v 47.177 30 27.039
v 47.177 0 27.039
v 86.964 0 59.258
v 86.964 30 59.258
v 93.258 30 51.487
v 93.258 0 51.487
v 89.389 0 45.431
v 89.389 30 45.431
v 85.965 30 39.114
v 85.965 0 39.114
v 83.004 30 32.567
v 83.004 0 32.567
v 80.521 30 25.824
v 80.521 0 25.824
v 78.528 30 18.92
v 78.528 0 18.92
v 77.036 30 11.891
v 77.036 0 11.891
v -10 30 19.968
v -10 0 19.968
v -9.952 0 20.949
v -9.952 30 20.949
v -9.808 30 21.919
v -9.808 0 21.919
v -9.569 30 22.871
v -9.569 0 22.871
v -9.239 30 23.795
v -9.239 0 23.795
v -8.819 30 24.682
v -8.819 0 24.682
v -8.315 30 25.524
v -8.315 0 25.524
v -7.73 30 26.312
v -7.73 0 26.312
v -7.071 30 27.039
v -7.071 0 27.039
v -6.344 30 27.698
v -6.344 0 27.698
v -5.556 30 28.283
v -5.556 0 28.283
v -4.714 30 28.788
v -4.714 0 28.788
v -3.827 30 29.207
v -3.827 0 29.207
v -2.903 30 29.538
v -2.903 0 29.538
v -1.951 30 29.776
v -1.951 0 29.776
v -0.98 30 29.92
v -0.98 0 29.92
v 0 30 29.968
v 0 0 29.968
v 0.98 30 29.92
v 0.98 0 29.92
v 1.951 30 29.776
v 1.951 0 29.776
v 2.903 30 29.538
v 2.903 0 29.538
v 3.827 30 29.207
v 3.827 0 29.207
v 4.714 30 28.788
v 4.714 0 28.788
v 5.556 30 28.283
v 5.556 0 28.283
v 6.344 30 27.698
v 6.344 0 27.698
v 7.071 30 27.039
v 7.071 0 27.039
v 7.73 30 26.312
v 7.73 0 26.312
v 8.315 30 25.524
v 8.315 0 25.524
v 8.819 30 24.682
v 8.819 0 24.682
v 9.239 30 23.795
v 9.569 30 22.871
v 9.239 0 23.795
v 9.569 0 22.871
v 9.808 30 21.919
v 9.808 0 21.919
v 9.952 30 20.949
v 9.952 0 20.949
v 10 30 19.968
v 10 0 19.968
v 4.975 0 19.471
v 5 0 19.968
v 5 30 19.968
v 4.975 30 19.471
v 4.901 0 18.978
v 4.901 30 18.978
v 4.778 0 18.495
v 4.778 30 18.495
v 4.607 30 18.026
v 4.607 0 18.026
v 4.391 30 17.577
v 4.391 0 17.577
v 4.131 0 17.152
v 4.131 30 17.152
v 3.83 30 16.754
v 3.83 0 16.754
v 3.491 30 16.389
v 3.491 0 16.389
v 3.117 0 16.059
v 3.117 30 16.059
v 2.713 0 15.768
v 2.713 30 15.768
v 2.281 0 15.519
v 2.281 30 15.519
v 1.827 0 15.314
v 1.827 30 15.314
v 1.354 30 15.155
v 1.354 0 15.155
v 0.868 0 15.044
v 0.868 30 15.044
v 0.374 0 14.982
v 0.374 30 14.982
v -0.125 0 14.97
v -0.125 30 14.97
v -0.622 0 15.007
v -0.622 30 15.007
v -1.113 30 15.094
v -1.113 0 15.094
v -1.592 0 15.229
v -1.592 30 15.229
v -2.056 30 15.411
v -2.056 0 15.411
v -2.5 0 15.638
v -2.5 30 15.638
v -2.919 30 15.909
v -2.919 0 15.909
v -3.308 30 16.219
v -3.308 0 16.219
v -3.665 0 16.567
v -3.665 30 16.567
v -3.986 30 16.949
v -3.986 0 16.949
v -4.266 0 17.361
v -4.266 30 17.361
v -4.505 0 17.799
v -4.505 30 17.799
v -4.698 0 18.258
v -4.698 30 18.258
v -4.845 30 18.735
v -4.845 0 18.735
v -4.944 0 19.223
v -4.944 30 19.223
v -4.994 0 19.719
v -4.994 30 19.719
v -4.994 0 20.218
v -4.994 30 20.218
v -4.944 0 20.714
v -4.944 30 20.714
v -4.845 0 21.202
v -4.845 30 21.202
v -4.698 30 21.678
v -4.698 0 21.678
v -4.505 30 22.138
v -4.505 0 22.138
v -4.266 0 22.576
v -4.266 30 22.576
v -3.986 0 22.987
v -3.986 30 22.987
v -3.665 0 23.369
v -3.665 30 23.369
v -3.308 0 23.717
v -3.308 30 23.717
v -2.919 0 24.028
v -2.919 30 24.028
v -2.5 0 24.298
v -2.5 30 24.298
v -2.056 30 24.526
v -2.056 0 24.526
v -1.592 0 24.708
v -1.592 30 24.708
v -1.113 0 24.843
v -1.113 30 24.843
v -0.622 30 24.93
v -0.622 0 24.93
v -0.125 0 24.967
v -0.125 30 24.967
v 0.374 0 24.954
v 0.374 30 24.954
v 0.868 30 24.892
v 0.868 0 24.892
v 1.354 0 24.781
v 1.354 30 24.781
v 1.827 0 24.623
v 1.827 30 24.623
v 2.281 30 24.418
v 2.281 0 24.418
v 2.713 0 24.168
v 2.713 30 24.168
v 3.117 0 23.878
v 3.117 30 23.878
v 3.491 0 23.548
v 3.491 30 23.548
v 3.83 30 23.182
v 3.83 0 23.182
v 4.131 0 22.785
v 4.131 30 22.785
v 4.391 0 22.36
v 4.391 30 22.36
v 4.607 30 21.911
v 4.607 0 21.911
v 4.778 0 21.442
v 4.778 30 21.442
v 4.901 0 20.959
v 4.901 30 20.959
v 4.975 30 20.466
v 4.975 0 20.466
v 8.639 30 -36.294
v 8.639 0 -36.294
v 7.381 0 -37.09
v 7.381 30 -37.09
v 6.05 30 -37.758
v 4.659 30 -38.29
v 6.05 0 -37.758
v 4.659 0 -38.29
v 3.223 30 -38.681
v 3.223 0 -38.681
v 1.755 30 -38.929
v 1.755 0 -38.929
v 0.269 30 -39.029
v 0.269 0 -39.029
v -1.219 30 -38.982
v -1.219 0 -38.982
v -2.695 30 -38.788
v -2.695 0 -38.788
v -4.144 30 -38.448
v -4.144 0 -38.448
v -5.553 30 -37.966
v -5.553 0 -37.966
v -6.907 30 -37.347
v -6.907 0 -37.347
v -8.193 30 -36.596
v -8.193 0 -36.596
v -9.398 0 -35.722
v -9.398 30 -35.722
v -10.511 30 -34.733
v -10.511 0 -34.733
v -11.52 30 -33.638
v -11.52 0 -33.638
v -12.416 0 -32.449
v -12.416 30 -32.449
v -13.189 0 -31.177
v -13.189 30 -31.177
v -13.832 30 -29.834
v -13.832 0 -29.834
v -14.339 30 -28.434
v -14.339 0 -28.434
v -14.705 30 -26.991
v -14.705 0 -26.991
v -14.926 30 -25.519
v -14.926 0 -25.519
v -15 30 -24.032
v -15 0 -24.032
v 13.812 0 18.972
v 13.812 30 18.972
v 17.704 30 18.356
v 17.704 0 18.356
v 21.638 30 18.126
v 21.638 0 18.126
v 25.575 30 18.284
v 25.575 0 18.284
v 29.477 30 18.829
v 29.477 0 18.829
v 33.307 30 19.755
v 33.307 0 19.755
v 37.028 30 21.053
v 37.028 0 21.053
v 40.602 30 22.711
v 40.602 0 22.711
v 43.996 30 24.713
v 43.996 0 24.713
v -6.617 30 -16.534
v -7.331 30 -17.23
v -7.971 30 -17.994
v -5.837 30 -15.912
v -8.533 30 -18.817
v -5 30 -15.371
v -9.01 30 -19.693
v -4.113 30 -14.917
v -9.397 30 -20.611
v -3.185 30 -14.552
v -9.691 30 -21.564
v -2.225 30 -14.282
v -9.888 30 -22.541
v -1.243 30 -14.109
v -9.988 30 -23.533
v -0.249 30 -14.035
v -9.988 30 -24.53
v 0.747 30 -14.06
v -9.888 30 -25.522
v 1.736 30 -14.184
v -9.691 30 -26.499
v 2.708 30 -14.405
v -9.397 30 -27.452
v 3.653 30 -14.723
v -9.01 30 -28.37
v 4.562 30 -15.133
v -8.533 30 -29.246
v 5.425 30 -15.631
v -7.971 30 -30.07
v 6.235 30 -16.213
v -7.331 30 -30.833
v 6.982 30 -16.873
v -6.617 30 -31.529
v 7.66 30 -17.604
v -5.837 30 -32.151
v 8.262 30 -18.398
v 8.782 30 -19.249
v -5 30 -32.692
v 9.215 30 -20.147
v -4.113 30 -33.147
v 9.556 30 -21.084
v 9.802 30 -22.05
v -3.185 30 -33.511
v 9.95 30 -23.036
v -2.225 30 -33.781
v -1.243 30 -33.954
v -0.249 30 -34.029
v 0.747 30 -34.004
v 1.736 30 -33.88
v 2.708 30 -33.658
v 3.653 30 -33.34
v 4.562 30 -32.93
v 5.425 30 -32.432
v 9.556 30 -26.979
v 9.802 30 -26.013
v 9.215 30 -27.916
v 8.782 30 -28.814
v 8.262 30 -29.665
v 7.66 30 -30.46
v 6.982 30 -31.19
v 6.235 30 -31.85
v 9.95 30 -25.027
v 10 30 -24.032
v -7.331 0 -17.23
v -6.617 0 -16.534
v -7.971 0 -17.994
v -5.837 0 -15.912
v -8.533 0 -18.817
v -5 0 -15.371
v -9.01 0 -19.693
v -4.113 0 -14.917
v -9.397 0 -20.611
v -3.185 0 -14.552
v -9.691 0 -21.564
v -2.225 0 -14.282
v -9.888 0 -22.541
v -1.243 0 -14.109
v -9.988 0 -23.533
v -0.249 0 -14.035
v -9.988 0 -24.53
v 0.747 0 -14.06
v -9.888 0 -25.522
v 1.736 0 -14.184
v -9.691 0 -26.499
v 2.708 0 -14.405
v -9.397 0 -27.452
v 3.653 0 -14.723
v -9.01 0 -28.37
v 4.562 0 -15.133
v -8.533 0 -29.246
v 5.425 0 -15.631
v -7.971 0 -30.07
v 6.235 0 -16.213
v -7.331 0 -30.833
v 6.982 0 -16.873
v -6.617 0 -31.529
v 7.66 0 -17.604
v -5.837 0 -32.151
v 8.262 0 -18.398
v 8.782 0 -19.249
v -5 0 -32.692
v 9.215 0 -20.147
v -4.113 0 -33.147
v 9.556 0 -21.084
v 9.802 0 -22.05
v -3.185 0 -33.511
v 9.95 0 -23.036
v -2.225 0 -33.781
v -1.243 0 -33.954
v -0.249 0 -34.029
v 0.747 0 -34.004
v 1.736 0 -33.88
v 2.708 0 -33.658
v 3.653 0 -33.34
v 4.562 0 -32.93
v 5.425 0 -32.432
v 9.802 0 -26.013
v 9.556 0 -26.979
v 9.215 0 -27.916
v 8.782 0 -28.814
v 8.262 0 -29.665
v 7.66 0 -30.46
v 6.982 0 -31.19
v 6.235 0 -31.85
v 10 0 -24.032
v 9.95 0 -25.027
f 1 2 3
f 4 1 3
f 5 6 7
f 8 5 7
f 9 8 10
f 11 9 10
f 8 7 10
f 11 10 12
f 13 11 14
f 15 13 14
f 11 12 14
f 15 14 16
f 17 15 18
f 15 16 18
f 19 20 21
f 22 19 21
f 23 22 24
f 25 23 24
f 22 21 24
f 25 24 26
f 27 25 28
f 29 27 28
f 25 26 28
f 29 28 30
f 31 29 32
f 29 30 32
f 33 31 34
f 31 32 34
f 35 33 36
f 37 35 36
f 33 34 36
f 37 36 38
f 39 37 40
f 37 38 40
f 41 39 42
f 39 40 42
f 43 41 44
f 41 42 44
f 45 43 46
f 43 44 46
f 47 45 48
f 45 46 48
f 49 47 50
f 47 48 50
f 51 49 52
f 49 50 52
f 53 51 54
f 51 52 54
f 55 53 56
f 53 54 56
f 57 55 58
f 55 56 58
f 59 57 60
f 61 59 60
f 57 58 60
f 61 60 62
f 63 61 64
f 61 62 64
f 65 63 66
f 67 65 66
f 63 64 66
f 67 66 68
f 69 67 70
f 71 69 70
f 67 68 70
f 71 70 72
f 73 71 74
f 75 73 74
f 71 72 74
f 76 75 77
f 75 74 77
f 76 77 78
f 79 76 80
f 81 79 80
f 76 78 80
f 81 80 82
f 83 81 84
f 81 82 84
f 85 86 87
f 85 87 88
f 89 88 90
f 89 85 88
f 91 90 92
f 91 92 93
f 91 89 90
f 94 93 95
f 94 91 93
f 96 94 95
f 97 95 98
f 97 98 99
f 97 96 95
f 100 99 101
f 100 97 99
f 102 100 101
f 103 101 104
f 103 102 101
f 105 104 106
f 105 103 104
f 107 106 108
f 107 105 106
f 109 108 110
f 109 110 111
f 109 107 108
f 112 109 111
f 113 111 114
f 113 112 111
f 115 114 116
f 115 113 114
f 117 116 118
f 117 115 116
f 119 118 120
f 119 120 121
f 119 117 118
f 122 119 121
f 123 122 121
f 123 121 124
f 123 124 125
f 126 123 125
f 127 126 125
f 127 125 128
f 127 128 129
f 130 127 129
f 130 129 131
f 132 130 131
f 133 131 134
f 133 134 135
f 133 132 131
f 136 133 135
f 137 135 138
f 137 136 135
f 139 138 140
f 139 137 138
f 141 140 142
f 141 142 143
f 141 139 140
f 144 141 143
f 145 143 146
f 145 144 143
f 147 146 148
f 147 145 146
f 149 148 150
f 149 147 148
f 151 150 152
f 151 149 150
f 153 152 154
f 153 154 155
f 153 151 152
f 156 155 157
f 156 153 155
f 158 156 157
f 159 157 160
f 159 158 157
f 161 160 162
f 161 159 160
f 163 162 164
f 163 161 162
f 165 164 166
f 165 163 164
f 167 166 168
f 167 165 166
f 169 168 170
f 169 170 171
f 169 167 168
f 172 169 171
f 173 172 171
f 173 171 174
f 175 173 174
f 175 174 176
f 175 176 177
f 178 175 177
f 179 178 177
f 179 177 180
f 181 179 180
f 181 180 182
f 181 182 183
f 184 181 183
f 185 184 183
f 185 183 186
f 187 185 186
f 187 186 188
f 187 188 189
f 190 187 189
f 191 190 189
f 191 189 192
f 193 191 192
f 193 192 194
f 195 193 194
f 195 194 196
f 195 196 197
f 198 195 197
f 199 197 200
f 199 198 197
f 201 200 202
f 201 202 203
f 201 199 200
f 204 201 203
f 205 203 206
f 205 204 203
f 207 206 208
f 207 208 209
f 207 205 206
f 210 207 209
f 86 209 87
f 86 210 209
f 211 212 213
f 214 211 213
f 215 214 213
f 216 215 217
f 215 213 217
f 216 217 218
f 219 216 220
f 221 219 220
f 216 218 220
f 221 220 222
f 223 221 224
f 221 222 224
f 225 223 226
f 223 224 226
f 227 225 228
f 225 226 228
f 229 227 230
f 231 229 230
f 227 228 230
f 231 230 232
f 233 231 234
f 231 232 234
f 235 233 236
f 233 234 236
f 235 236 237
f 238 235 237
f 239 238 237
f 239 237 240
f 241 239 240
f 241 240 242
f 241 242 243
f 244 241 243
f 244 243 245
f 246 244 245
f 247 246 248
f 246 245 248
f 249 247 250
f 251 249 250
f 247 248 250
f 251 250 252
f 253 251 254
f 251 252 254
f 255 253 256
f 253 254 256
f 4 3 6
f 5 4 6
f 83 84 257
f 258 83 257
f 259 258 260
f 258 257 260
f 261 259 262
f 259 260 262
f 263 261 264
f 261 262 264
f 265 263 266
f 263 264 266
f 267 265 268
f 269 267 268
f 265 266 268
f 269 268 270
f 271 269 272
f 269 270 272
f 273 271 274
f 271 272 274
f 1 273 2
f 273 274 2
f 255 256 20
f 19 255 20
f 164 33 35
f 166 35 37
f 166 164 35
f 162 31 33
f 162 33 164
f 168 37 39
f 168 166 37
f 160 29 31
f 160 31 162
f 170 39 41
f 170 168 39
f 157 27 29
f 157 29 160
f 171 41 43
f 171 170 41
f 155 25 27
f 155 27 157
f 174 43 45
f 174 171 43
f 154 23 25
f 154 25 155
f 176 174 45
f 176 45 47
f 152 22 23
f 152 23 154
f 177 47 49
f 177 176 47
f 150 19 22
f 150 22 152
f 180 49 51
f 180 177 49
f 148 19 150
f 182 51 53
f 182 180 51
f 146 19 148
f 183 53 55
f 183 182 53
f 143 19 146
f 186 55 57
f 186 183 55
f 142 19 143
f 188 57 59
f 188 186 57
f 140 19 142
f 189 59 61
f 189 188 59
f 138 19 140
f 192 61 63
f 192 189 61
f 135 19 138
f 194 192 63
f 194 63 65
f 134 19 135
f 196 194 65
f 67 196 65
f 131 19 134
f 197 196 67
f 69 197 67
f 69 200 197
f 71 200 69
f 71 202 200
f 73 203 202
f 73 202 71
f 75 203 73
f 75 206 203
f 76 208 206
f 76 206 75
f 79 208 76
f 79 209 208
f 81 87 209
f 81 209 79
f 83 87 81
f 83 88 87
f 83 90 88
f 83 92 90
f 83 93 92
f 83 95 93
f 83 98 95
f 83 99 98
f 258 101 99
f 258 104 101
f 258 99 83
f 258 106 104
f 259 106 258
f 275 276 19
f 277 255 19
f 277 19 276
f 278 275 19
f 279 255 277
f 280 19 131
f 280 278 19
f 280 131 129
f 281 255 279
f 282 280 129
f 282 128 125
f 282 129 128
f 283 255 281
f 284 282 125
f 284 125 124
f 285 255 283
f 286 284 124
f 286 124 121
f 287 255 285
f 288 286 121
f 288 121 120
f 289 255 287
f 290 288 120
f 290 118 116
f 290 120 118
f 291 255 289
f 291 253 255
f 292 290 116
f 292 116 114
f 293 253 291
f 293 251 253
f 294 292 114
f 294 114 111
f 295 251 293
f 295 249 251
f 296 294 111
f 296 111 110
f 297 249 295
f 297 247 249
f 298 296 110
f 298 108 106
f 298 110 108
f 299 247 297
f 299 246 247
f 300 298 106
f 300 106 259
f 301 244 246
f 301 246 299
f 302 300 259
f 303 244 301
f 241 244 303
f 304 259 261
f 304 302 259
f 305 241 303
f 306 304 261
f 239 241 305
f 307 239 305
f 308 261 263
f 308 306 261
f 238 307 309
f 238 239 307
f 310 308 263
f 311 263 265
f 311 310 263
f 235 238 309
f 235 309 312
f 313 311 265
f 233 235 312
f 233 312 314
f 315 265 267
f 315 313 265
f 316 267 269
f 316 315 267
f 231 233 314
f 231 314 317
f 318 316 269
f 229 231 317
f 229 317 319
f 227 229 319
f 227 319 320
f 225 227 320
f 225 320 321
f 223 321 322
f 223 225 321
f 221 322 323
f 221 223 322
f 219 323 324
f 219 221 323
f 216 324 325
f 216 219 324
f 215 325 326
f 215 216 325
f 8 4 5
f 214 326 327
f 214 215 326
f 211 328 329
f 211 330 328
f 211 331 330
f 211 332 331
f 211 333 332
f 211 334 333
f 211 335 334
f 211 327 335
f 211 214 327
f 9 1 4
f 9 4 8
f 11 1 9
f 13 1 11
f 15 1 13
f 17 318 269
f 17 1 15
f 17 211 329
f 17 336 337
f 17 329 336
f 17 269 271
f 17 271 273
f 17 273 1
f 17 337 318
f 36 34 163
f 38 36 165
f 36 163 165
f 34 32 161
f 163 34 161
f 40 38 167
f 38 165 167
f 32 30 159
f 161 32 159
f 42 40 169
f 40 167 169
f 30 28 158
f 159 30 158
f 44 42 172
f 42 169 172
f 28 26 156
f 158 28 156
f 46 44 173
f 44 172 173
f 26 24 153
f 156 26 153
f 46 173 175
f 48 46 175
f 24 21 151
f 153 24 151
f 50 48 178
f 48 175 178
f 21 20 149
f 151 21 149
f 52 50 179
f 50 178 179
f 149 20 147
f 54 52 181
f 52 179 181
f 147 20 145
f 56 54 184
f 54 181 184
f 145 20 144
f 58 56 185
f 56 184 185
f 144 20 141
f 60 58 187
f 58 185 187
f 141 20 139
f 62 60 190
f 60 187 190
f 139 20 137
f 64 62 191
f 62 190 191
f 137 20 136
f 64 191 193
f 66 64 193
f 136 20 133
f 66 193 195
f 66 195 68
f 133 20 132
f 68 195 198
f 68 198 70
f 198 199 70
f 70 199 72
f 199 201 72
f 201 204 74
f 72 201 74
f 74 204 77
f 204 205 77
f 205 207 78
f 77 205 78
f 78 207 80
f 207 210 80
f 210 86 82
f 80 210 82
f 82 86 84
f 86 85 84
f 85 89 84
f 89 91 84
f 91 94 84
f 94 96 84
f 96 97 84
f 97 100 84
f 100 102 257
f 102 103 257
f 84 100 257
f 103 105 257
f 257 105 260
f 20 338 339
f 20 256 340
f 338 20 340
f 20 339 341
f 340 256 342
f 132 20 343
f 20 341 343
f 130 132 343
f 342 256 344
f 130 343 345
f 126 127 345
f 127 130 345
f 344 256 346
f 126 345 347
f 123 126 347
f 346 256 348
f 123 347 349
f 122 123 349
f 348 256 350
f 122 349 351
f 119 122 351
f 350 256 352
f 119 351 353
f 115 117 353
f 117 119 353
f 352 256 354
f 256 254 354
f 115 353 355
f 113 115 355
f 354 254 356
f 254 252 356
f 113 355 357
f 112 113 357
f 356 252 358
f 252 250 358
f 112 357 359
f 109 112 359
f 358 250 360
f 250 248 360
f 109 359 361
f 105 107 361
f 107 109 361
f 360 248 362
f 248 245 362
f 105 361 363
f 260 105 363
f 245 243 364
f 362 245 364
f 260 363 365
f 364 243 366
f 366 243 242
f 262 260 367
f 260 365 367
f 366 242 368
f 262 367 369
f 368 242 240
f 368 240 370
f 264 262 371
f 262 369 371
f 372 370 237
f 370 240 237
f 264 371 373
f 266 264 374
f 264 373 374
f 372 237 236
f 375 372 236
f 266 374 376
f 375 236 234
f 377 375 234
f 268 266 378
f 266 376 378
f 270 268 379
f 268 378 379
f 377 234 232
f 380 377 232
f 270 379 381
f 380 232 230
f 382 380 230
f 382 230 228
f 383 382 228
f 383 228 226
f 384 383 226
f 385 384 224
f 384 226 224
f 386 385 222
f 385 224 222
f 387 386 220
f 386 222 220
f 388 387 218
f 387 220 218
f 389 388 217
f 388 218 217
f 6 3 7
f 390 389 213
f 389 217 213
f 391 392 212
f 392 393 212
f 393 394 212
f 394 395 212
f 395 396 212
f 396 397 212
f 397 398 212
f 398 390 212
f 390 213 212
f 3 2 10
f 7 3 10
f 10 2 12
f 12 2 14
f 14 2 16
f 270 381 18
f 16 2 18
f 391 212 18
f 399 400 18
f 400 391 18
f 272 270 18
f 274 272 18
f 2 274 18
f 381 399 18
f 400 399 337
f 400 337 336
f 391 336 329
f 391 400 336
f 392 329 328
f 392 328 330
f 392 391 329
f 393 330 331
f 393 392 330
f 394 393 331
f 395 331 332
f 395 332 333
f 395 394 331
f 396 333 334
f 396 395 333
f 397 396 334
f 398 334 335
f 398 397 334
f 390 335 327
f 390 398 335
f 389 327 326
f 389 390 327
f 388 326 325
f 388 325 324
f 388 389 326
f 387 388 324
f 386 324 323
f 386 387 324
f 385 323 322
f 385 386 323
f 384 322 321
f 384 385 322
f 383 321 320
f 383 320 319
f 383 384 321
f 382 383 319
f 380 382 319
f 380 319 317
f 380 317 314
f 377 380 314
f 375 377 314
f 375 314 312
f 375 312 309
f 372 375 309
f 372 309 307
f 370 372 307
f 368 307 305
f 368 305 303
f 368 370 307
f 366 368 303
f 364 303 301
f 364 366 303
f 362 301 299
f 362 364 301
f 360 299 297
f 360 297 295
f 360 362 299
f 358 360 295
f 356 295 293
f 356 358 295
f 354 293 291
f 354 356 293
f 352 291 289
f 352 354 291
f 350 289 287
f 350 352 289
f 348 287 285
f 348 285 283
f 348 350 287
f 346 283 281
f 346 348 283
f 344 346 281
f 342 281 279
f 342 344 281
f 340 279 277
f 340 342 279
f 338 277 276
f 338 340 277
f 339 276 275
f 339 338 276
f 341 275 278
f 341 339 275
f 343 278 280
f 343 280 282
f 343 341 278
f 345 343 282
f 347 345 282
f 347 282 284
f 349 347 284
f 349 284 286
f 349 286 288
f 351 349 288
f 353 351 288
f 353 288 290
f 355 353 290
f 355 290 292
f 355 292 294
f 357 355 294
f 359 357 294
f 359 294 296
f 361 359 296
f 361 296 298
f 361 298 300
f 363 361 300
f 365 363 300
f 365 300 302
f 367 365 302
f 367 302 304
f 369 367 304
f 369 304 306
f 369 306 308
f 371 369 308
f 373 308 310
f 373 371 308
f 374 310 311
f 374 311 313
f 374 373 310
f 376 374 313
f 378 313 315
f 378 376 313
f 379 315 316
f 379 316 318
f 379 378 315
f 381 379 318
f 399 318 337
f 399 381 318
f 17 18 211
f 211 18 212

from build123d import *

# Parameters (mm, degrees)
SKETCH1_R           = 10
SKETCH1_R_2         = 5
BOSS_EXTRUDE1_DEPTH = 30


with BuildPart() as part:
    # Sketch1 → Boss-Extrude1 (new body)
    with BuildSketch(Plane(origin=(0, 0, 0), x_dir=(1, 0, 0), z_dir=(0, 1, 0))):
        with BuildLine():
            Line((-15, 24.031639244), (-10, -19.968360756))
            ThreePointArc((-10, -19.968360756), (0, -29.968360756), (10, -19.968360756))
            ThreePointArc((10, -19.968360756), (29.477373415, -18.829083409), (47.176676653, -27.038875908))
            Line((47.176676653, -27.038875908), (86.964311464, -59.258267297))
            Line((86.964311464, -59.258267297), (93.257515375, -51.486807682))
            ThreePointArc((93.257515375, -51.486807682), (83.004155911, -32.566658766), (77.036161898, -11.890913004))
            Line((77.036161898, -11.890913004), (8.638834838, 36.294205559))
            ThreePointArc((8.638834838, 36.294205559), (-6.907151274, 37.346715709), (-15, 24.031639244))
        make_face()
        with Locations((0, 24.031639244)):
            Circle(SKETCH1_R, mode=Mode.SUBTRACT)
        with Locations((0, -19.968360756)):
            Circle(SKETCH1_R_2, mode=Mode.SUBTRACT)
    extrude(amount=BOSS_EXTRUDE1_DEPTH)


solid = part.part
